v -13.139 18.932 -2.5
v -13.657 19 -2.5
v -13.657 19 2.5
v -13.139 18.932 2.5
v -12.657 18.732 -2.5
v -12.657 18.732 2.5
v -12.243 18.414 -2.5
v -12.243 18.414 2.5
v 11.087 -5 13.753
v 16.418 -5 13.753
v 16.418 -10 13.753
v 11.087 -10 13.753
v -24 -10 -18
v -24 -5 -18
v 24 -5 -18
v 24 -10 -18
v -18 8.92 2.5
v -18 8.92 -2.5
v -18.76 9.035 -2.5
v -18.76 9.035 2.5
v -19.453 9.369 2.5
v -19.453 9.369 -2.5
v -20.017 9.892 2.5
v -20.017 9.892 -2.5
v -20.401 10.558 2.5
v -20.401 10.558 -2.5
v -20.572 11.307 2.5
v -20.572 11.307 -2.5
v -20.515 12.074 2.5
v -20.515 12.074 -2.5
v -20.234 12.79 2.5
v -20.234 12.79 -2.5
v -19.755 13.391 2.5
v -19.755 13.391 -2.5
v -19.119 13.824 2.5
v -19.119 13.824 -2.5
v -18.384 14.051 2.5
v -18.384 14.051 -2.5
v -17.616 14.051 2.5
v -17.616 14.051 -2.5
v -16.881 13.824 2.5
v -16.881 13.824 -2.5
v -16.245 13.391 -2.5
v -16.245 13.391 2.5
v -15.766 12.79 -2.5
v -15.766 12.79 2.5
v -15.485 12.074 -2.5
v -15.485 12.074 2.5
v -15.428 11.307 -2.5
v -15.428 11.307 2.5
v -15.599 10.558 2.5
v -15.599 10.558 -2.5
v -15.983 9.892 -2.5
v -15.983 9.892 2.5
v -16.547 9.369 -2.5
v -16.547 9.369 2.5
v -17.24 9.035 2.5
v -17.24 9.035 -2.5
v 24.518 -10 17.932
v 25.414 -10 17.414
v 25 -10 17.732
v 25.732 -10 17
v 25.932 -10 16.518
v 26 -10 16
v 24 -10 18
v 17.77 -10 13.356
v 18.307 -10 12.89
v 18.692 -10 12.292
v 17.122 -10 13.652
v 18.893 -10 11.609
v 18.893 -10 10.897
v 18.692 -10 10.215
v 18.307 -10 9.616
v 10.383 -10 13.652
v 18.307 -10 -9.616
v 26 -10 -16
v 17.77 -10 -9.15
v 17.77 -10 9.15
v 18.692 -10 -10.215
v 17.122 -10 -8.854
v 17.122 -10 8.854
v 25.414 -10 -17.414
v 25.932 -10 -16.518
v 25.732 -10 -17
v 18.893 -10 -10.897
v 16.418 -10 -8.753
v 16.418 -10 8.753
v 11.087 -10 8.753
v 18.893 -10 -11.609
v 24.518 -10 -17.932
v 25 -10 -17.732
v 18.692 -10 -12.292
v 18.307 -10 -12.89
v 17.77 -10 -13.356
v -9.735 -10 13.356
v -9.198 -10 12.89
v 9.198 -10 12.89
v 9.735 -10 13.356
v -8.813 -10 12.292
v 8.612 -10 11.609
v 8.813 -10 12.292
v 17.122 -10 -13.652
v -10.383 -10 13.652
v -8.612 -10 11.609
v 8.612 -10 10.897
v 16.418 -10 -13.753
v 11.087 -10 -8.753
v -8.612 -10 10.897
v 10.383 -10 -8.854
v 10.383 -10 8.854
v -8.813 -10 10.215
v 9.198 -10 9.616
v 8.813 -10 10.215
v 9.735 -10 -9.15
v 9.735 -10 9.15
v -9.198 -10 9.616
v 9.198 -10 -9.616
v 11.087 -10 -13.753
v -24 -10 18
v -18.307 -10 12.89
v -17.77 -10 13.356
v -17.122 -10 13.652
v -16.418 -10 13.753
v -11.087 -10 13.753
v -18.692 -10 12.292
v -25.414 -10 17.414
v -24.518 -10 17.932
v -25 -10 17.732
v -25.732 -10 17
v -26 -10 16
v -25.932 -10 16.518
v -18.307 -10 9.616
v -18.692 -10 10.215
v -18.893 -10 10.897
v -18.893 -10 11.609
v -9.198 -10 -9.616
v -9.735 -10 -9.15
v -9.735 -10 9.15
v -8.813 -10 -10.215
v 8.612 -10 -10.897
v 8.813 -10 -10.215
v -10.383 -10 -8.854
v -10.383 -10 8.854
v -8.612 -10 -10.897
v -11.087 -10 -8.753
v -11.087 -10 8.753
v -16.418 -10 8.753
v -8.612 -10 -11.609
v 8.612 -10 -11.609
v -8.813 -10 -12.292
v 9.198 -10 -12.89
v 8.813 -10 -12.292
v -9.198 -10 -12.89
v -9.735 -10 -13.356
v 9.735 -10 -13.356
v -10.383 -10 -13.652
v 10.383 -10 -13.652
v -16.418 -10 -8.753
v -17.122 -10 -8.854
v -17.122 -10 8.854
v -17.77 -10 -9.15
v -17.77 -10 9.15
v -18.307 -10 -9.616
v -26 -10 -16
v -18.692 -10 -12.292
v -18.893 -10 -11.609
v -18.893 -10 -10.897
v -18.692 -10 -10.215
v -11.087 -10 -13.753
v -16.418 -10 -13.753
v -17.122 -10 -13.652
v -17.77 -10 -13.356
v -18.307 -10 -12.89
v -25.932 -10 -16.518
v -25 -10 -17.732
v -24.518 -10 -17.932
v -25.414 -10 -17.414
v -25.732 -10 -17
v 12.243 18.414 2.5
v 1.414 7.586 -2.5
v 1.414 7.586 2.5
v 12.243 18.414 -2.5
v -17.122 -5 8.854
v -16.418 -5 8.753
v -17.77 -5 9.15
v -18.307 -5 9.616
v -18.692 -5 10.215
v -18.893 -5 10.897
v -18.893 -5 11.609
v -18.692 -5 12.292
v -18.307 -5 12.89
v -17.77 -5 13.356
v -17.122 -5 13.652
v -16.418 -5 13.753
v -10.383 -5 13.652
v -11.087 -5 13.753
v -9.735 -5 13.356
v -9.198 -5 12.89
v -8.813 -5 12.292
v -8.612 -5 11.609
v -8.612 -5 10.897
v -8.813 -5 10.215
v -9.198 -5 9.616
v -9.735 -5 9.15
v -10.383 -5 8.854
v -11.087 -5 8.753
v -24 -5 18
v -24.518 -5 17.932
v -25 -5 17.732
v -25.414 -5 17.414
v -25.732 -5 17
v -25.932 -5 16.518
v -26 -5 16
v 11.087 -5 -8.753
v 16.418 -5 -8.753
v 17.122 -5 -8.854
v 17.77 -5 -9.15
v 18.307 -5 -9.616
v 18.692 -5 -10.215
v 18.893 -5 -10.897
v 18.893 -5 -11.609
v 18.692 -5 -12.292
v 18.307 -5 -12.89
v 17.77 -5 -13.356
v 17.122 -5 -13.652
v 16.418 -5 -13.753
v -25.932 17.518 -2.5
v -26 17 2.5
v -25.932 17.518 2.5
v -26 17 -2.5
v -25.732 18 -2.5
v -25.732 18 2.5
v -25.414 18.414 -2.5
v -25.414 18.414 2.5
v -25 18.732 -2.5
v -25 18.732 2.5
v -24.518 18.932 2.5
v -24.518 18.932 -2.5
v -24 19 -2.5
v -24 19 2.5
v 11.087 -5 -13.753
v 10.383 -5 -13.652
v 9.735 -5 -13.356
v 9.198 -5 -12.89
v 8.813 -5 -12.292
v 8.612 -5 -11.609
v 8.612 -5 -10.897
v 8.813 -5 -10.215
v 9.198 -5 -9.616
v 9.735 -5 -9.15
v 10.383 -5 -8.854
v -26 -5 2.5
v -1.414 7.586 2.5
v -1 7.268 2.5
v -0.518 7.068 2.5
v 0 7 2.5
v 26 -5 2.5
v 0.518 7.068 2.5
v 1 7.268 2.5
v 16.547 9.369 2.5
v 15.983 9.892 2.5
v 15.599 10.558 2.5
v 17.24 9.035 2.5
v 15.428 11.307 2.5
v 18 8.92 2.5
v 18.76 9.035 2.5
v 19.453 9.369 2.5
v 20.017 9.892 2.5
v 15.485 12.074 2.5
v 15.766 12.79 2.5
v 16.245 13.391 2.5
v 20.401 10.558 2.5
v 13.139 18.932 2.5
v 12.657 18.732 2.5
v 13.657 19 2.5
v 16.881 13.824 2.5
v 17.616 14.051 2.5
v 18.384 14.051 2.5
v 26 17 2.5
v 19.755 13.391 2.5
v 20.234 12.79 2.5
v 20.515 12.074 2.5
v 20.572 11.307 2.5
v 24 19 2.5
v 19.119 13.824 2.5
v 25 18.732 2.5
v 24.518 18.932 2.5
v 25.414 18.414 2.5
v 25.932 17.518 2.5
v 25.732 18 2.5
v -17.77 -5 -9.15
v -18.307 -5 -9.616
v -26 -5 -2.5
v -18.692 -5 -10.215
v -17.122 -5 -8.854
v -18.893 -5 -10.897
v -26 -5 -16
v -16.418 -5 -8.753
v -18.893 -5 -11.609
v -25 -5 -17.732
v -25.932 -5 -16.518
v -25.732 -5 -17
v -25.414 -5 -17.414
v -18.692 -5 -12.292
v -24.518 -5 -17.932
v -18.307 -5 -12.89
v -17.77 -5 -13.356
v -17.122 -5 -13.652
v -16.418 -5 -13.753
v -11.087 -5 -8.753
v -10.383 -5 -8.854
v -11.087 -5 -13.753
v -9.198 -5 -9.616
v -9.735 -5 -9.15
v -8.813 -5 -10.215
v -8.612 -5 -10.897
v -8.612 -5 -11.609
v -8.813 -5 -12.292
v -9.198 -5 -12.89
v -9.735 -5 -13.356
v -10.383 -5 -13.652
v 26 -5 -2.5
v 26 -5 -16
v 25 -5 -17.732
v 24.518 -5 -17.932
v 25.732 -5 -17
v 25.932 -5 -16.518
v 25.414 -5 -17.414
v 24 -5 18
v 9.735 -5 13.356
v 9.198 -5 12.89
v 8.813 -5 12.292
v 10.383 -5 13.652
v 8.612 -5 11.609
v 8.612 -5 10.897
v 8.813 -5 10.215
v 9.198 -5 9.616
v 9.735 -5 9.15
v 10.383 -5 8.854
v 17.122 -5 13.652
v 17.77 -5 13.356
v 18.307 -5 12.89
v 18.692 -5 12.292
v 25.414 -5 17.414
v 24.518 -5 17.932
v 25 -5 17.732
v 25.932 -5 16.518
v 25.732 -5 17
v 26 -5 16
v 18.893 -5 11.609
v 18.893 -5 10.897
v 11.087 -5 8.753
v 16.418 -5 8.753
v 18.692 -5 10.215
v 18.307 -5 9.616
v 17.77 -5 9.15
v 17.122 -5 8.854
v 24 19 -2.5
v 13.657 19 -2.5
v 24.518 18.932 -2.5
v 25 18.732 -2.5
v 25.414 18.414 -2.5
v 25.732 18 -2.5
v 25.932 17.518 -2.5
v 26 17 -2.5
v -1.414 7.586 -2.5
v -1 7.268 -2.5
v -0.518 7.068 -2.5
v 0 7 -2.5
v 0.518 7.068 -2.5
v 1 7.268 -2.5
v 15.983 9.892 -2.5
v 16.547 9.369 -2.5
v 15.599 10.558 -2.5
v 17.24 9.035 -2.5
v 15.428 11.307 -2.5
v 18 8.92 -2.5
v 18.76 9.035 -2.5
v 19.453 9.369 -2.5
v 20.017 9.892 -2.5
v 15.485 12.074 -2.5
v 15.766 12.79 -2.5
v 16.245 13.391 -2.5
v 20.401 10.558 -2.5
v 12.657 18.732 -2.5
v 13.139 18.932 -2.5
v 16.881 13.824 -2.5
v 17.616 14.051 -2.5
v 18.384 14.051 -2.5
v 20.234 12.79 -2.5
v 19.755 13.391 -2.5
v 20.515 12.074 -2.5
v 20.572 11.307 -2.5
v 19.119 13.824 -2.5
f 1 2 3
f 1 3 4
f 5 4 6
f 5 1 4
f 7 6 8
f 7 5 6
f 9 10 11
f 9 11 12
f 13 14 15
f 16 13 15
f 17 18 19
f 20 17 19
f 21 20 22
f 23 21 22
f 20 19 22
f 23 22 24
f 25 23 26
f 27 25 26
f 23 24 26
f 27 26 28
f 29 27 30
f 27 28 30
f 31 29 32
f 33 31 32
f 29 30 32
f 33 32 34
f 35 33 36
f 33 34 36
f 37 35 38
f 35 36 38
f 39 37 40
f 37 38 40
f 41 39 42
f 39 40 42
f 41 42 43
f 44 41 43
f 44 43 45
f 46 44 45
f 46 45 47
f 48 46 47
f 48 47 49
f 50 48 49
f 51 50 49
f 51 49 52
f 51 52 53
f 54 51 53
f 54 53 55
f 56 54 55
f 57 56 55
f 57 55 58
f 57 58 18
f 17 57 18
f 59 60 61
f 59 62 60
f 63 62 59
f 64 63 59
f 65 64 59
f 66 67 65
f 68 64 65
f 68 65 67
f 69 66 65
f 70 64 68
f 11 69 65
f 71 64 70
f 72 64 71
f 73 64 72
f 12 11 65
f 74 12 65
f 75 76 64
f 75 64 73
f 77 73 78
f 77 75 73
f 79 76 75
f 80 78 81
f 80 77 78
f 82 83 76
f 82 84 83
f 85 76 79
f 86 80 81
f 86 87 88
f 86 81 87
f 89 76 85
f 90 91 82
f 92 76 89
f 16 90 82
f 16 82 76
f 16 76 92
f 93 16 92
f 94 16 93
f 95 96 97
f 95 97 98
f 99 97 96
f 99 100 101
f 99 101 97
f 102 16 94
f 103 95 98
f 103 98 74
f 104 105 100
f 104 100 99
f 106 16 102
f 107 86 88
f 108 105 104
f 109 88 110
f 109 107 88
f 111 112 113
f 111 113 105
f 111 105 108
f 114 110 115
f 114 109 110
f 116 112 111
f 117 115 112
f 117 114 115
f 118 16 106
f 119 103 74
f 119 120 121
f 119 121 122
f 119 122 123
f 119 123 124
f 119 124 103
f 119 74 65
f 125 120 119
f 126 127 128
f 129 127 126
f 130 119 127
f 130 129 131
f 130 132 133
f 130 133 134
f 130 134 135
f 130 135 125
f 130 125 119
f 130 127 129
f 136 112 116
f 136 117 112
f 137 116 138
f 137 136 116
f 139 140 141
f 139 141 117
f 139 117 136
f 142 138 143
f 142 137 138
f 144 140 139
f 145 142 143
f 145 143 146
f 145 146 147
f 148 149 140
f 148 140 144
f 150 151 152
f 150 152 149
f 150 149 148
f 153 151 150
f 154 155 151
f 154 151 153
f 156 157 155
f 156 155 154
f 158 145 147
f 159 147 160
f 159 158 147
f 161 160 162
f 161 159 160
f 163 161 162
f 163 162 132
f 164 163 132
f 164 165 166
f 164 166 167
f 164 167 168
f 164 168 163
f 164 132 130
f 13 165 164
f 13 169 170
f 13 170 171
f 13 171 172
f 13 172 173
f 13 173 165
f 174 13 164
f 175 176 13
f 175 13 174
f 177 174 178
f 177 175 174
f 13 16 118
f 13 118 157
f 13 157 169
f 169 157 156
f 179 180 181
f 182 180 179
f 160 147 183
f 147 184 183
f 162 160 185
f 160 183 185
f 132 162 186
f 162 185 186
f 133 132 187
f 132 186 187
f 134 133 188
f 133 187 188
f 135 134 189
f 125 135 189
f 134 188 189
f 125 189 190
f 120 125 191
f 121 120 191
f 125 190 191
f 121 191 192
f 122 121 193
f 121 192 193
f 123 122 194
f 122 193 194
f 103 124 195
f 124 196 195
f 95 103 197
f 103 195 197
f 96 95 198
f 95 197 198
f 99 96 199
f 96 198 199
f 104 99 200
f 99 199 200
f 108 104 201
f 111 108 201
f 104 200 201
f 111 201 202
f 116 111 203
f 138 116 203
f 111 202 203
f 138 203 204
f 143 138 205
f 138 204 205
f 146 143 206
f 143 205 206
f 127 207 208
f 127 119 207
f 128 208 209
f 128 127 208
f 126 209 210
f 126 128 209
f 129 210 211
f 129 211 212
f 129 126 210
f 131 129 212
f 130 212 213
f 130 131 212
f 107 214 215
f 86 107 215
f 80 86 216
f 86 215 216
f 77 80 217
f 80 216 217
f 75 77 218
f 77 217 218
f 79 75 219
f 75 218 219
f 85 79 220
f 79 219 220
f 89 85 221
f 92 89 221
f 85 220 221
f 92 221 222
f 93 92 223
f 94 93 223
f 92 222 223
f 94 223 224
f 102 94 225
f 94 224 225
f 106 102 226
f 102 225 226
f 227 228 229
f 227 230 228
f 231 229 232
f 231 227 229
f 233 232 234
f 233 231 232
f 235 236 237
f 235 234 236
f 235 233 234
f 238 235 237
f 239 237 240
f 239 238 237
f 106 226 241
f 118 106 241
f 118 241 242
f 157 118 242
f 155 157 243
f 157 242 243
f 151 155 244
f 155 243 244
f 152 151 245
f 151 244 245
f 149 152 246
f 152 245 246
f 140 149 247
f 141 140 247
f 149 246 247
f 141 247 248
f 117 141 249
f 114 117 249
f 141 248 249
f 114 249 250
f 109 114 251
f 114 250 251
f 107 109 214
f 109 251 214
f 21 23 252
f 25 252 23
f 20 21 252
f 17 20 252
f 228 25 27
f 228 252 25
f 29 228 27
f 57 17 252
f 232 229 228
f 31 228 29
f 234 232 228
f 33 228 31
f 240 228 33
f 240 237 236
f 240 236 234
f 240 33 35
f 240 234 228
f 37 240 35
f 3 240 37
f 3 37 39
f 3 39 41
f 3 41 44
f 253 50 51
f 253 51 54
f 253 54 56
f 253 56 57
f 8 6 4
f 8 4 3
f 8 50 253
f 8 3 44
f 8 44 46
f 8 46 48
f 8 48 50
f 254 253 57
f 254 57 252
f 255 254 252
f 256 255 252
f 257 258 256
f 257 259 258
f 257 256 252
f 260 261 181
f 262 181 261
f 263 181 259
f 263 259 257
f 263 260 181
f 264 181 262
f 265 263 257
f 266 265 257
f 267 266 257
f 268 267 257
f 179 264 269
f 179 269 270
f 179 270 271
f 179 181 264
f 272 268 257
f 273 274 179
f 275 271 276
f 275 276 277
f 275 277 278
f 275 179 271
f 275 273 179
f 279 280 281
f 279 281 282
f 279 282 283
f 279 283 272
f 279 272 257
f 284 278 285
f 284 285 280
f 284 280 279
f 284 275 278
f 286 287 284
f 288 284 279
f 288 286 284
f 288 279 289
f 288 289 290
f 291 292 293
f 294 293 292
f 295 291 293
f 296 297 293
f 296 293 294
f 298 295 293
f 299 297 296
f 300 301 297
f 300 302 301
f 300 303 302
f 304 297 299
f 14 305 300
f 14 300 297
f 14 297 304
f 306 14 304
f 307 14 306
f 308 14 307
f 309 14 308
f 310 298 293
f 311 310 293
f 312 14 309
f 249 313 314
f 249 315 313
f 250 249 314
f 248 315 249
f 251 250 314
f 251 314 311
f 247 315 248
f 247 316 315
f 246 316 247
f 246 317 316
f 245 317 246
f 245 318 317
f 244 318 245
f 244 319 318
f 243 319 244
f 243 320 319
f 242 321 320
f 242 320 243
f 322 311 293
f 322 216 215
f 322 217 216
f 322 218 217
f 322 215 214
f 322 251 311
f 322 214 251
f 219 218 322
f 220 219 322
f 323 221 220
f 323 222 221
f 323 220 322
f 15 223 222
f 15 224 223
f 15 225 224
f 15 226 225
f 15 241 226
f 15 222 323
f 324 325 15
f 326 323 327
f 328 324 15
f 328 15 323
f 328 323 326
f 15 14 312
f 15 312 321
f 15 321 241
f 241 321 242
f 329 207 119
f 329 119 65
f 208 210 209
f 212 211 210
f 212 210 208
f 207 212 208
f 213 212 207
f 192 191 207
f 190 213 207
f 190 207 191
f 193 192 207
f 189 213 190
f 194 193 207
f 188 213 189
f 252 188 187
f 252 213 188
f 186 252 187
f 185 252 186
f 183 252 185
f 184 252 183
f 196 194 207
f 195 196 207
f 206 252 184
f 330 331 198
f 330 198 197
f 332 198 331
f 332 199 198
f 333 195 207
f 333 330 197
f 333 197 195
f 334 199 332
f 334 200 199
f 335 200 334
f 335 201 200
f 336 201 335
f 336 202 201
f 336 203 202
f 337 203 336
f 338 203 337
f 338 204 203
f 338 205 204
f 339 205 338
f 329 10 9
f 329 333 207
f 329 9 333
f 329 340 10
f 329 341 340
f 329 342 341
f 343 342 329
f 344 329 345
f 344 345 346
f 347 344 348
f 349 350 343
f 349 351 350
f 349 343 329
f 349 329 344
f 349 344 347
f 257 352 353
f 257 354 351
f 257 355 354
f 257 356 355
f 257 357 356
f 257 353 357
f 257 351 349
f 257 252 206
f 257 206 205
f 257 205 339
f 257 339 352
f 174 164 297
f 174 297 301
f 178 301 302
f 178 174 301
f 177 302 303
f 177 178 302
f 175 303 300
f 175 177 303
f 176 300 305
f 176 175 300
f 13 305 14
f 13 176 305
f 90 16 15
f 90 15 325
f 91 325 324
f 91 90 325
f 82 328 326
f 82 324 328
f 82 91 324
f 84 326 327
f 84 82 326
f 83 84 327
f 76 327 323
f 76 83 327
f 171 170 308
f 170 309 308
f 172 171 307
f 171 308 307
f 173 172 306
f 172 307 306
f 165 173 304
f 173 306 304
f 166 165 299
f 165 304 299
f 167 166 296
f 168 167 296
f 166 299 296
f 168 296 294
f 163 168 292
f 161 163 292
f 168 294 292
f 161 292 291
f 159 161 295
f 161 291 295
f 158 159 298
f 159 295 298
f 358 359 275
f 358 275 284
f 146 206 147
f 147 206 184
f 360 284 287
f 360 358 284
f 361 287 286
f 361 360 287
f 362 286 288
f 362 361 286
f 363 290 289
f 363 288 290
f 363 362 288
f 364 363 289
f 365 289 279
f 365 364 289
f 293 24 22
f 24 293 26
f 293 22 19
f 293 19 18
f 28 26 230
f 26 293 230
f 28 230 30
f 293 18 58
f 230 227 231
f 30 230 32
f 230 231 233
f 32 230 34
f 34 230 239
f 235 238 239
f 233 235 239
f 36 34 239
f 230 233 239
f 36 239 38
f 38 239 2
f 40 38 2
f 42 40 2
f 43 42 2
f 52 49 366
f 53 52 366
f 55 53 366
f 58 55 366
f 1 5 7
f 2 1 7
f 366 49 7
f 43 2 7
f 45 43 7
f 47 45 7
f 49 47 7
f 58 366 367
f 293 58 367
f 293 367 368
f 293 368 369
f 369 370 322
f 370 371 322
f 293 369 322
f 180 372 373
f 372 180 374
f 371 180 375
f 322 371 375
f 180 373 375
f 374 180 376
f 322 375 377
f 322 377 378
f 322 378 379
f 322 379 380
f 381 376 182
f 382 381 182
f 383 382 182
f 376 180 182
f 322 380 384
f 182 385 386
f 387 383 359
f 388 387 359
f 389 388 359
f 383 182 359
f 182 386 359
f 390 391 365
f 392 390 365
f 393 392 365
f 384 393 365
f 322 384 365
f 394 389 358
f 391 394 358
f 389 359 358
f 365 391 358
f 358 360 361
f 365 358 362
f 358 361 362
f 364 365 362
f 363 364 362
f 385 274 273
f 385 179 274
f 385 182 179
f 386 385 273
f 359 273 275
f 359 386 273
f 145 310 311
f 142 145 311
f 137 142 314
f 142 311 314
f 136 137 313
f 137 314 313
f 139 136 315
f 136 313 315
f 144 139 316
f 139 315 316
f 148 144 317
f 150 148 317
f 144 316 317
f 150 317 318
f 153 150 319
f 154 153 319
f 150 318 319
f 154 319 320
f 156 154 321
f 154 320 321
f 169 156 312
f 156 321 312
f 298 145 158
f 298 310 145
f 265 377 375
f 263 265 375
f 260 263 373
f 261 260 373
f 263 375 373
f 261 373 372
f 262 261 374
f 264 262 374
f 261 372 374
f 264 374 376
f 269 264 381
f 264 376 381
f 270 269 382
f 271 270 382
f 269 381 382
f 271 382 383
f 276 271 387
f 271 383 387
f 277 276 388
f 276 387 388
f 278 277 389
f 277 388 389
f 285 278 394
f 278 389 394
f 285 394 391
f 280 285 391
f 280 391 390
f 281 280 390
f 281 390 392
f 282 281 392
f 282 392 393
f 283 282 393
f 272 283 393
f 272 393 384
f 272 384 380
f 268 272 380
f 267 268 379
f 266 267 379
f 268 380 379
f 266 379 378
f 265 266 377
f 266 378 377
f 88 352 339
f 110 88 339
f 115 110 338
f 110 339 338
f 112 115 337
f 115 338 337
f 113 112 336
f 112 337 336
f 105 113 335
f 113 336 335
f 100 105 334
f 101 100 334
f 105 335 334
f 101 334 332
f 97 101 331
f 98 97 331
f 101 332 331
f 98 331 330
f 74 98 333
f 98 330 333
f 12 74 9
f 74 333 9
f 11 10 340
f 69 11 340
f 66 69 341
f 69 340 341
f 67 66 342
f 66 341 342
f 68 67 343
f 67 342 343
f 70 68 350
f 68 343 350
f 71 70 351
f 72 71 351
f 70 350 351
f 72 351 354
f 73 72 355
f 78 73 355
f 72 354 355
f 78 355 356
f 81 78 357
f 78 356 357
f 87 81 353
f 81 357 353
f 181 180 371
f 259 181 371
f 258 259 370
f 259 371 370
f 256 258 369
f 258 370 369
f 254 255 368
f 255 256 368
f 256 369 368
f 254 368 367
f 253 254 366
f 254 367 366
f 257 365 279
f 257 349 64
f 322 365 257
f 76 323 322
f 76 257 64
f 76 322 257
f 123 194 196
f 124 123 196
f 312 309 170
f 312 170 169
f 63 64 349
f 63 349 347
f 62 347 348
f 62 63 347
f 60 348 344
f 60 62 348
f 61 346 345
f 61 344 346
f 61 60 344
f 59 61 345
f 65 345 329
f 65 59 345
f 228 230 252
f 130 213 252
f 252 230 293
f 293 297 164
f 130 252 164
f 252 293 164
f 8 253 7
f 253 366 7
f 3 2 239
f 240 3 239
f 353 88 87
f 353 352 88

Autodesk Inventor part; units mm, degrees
ref_plane "YZ Plane" through (0, 0, 0) normal (1, 0, 0) x (0, 1, 0)
ref_plane "XZ Plane" through (0, 0, 0) normal (0, 1, 0) x (-1, 0, 0)
ref_plane "XY Plane" through (0, 0, 0) normal (0, 0, 1) x (1, 0, 0)
sketch "Sketch1" plane through (0, 0, 0) normal (0, 0, 1) x (1, 0, 0)
  line L0 (0, 0) -> (0, -31.9527)
  line L1 (13.6569, 19) -> (24, 19)
  line L2 (1.4142, 7.5858) -> (12.2426, 18.4142)
  line L3 (26, 17) -> (26, -10)
  line L4 (26, -10) -> (0, -10)
  line L5 (-13.6569, 19) -> (-24, 19)
  line L6 (-1.4142, 7.5858) -> (-12.2426, 18.4142)
  line L7 (-26, 17) -> (-26, -10)
  line L8 (-26, -10) -> (0, -10)
  line L9 (-26, -5) -> (26, -5)
  arc A0 (-24, 19) -> (-26, 17) centre (-24, 17) ccw
  arc A1 (-12.2426, 18.4142) -> (-13.6569, 19) centre (-13.6569, 17) ccw
  arc A2 (-1.4142, 7.5858) -> (1.4142, 7.5858) centre (0, 9) ccw
  arc A3 (13.6569, 19) -> (12.2426, 18.4142) centre (13.6569, 17) ccw
  arc A4 (26, 17) -> (24, 19) centre (24, 17) ccw
  point P0 (-18, 11.5)
  point P1 (18, 11.5)
  point P2 (12.8284, 19)
  point P3 (26, 19)
  point P4 (-12.8284, 19)
  point P5 (-26, 19)
  dimension "d0" = 36
  dimension "d1" = 18
  dimension "d2" = 135
  dimension "d3" = 19
  dimension "d4" = 11.5
  dimension "d5" = 5
  dimension "d6" = 24
  dimension "d7" = 26
  dimension "d10" = 2
  dimension "d11" = 10
extrude "Extrusion1" add sketch "Sketch1" along normal mid plane 5 contours L9 L7 A0 L5 A1 L6 A2 L2 A3 L1 A4 L3
hole "Hole1" at (-18, 11.5, 0) at (18, 11.5, 0) direction (0, 0, -1) diameter 5.159 end through all both
extrude "Extrusion2" add sketch "Sketch1" along normal mid plane 36 contours L9 L3 L4 L0 | L0 L8 L7 L9
fillet "Fillet1" radius 2 4 edges at (-26, -7.5, 18) (26, -7.5, 18) (-26, -7.5, -18) (26, -7.5, -18)
sketch "Sketch2" plane through (-26, -5, -2.5) normal (0, 1, 0) x (1, 0, 0)
  line L0 (42.418, 8.7532) -> (37.087, 8.7532) construction
  line L1 (42.418, 11.2532) -> (37.087, 11.2532)
  line L2 (37.087, 6.2532) -> (42.418, 6.2532)
  arc A0 (42.418, 6.2532) -> (42.418, 11.2532) centre (42.418, 8.7532) ccw
  arc A1 (37.087, 11.2532) -> (37.087, 6.2532) centre (37.087, 8.7532) ccw
  line L3 (69.9256, -2.5) -> (59.9264, -2.5) projected
  line L4 (36.6897, -2.5) -> (64.1036, -2.5) projected
  line L5 (42.418, -13.7532) -> (37.087, -13.7532) construction
  line L6 (42.418, -16.2532) -> (37.087, -16.2532)
  line L7 (37.087, -11.2532) -> (42.418, -11.2532)
  arc A2 (42.418, -16.2532) -> (42.418, -11.2532) centre (42.418, -13.7532) ccw
  arc A3 (37.087, -11.2532) -> (37.087, -16.2532) centre (37.087, -13.7532) ccw
  line L8 (52, 0) -> (0, 0) projected
  line L9 (26, 0) -> (26, 17.4848)
  line L10 (9.582, 8.7532) -> (14.913, 8.7532) construction
  line L11 (9.582, 11.2532) -> (14.913, 11.2532)
  line L12 (14.913, 6.2532) -> (9.582, 6.2532)
  arc A4 (9.582, 11.2532) -> (9.582, 6.2532) centre (9.582, 8.7532) ccw
  arc A5 (14.913, 6.2532) -> (14.913, 11.2532) centre (14.913, 8.7532) ccw
  line L13 (9.582, -13.7532) -> (14.913, -13.7532) construction
  line L14 (9.582, -16.2532) -> (14.913, -16.2532)
  line L15 (14.913, -11.2532) -> (9.582, -11.2532)
  arc A6 (9.582, -11.2532) -> (9.582, -16.2532) centre (9.582, -13.7532) ccw
  arc A7 (14.913, -16.2532) -> (14.913, -11.2532) centre (14.913, -13.7532) ccw
  point P0 (26, -2.5)
  point P1 (39.7525, 8.7532)
  point P2 (39.7525, -13.7532)
  point P3 (26, -2.5)
  point P4 (26, -2.5)
  point P5 (26, -2.5)
  point P6 (12.2475, 8.7532)
  point P7 (15.3103, -2.5)
  point P8 (12.2475, -13.7532)
  dimension "d24" = 5
extrude "Extrusion3" cut sketch "Sketch2" against normal through all
equation "\"d1\" = 0.5 * d0"
properties part number "basepart"
